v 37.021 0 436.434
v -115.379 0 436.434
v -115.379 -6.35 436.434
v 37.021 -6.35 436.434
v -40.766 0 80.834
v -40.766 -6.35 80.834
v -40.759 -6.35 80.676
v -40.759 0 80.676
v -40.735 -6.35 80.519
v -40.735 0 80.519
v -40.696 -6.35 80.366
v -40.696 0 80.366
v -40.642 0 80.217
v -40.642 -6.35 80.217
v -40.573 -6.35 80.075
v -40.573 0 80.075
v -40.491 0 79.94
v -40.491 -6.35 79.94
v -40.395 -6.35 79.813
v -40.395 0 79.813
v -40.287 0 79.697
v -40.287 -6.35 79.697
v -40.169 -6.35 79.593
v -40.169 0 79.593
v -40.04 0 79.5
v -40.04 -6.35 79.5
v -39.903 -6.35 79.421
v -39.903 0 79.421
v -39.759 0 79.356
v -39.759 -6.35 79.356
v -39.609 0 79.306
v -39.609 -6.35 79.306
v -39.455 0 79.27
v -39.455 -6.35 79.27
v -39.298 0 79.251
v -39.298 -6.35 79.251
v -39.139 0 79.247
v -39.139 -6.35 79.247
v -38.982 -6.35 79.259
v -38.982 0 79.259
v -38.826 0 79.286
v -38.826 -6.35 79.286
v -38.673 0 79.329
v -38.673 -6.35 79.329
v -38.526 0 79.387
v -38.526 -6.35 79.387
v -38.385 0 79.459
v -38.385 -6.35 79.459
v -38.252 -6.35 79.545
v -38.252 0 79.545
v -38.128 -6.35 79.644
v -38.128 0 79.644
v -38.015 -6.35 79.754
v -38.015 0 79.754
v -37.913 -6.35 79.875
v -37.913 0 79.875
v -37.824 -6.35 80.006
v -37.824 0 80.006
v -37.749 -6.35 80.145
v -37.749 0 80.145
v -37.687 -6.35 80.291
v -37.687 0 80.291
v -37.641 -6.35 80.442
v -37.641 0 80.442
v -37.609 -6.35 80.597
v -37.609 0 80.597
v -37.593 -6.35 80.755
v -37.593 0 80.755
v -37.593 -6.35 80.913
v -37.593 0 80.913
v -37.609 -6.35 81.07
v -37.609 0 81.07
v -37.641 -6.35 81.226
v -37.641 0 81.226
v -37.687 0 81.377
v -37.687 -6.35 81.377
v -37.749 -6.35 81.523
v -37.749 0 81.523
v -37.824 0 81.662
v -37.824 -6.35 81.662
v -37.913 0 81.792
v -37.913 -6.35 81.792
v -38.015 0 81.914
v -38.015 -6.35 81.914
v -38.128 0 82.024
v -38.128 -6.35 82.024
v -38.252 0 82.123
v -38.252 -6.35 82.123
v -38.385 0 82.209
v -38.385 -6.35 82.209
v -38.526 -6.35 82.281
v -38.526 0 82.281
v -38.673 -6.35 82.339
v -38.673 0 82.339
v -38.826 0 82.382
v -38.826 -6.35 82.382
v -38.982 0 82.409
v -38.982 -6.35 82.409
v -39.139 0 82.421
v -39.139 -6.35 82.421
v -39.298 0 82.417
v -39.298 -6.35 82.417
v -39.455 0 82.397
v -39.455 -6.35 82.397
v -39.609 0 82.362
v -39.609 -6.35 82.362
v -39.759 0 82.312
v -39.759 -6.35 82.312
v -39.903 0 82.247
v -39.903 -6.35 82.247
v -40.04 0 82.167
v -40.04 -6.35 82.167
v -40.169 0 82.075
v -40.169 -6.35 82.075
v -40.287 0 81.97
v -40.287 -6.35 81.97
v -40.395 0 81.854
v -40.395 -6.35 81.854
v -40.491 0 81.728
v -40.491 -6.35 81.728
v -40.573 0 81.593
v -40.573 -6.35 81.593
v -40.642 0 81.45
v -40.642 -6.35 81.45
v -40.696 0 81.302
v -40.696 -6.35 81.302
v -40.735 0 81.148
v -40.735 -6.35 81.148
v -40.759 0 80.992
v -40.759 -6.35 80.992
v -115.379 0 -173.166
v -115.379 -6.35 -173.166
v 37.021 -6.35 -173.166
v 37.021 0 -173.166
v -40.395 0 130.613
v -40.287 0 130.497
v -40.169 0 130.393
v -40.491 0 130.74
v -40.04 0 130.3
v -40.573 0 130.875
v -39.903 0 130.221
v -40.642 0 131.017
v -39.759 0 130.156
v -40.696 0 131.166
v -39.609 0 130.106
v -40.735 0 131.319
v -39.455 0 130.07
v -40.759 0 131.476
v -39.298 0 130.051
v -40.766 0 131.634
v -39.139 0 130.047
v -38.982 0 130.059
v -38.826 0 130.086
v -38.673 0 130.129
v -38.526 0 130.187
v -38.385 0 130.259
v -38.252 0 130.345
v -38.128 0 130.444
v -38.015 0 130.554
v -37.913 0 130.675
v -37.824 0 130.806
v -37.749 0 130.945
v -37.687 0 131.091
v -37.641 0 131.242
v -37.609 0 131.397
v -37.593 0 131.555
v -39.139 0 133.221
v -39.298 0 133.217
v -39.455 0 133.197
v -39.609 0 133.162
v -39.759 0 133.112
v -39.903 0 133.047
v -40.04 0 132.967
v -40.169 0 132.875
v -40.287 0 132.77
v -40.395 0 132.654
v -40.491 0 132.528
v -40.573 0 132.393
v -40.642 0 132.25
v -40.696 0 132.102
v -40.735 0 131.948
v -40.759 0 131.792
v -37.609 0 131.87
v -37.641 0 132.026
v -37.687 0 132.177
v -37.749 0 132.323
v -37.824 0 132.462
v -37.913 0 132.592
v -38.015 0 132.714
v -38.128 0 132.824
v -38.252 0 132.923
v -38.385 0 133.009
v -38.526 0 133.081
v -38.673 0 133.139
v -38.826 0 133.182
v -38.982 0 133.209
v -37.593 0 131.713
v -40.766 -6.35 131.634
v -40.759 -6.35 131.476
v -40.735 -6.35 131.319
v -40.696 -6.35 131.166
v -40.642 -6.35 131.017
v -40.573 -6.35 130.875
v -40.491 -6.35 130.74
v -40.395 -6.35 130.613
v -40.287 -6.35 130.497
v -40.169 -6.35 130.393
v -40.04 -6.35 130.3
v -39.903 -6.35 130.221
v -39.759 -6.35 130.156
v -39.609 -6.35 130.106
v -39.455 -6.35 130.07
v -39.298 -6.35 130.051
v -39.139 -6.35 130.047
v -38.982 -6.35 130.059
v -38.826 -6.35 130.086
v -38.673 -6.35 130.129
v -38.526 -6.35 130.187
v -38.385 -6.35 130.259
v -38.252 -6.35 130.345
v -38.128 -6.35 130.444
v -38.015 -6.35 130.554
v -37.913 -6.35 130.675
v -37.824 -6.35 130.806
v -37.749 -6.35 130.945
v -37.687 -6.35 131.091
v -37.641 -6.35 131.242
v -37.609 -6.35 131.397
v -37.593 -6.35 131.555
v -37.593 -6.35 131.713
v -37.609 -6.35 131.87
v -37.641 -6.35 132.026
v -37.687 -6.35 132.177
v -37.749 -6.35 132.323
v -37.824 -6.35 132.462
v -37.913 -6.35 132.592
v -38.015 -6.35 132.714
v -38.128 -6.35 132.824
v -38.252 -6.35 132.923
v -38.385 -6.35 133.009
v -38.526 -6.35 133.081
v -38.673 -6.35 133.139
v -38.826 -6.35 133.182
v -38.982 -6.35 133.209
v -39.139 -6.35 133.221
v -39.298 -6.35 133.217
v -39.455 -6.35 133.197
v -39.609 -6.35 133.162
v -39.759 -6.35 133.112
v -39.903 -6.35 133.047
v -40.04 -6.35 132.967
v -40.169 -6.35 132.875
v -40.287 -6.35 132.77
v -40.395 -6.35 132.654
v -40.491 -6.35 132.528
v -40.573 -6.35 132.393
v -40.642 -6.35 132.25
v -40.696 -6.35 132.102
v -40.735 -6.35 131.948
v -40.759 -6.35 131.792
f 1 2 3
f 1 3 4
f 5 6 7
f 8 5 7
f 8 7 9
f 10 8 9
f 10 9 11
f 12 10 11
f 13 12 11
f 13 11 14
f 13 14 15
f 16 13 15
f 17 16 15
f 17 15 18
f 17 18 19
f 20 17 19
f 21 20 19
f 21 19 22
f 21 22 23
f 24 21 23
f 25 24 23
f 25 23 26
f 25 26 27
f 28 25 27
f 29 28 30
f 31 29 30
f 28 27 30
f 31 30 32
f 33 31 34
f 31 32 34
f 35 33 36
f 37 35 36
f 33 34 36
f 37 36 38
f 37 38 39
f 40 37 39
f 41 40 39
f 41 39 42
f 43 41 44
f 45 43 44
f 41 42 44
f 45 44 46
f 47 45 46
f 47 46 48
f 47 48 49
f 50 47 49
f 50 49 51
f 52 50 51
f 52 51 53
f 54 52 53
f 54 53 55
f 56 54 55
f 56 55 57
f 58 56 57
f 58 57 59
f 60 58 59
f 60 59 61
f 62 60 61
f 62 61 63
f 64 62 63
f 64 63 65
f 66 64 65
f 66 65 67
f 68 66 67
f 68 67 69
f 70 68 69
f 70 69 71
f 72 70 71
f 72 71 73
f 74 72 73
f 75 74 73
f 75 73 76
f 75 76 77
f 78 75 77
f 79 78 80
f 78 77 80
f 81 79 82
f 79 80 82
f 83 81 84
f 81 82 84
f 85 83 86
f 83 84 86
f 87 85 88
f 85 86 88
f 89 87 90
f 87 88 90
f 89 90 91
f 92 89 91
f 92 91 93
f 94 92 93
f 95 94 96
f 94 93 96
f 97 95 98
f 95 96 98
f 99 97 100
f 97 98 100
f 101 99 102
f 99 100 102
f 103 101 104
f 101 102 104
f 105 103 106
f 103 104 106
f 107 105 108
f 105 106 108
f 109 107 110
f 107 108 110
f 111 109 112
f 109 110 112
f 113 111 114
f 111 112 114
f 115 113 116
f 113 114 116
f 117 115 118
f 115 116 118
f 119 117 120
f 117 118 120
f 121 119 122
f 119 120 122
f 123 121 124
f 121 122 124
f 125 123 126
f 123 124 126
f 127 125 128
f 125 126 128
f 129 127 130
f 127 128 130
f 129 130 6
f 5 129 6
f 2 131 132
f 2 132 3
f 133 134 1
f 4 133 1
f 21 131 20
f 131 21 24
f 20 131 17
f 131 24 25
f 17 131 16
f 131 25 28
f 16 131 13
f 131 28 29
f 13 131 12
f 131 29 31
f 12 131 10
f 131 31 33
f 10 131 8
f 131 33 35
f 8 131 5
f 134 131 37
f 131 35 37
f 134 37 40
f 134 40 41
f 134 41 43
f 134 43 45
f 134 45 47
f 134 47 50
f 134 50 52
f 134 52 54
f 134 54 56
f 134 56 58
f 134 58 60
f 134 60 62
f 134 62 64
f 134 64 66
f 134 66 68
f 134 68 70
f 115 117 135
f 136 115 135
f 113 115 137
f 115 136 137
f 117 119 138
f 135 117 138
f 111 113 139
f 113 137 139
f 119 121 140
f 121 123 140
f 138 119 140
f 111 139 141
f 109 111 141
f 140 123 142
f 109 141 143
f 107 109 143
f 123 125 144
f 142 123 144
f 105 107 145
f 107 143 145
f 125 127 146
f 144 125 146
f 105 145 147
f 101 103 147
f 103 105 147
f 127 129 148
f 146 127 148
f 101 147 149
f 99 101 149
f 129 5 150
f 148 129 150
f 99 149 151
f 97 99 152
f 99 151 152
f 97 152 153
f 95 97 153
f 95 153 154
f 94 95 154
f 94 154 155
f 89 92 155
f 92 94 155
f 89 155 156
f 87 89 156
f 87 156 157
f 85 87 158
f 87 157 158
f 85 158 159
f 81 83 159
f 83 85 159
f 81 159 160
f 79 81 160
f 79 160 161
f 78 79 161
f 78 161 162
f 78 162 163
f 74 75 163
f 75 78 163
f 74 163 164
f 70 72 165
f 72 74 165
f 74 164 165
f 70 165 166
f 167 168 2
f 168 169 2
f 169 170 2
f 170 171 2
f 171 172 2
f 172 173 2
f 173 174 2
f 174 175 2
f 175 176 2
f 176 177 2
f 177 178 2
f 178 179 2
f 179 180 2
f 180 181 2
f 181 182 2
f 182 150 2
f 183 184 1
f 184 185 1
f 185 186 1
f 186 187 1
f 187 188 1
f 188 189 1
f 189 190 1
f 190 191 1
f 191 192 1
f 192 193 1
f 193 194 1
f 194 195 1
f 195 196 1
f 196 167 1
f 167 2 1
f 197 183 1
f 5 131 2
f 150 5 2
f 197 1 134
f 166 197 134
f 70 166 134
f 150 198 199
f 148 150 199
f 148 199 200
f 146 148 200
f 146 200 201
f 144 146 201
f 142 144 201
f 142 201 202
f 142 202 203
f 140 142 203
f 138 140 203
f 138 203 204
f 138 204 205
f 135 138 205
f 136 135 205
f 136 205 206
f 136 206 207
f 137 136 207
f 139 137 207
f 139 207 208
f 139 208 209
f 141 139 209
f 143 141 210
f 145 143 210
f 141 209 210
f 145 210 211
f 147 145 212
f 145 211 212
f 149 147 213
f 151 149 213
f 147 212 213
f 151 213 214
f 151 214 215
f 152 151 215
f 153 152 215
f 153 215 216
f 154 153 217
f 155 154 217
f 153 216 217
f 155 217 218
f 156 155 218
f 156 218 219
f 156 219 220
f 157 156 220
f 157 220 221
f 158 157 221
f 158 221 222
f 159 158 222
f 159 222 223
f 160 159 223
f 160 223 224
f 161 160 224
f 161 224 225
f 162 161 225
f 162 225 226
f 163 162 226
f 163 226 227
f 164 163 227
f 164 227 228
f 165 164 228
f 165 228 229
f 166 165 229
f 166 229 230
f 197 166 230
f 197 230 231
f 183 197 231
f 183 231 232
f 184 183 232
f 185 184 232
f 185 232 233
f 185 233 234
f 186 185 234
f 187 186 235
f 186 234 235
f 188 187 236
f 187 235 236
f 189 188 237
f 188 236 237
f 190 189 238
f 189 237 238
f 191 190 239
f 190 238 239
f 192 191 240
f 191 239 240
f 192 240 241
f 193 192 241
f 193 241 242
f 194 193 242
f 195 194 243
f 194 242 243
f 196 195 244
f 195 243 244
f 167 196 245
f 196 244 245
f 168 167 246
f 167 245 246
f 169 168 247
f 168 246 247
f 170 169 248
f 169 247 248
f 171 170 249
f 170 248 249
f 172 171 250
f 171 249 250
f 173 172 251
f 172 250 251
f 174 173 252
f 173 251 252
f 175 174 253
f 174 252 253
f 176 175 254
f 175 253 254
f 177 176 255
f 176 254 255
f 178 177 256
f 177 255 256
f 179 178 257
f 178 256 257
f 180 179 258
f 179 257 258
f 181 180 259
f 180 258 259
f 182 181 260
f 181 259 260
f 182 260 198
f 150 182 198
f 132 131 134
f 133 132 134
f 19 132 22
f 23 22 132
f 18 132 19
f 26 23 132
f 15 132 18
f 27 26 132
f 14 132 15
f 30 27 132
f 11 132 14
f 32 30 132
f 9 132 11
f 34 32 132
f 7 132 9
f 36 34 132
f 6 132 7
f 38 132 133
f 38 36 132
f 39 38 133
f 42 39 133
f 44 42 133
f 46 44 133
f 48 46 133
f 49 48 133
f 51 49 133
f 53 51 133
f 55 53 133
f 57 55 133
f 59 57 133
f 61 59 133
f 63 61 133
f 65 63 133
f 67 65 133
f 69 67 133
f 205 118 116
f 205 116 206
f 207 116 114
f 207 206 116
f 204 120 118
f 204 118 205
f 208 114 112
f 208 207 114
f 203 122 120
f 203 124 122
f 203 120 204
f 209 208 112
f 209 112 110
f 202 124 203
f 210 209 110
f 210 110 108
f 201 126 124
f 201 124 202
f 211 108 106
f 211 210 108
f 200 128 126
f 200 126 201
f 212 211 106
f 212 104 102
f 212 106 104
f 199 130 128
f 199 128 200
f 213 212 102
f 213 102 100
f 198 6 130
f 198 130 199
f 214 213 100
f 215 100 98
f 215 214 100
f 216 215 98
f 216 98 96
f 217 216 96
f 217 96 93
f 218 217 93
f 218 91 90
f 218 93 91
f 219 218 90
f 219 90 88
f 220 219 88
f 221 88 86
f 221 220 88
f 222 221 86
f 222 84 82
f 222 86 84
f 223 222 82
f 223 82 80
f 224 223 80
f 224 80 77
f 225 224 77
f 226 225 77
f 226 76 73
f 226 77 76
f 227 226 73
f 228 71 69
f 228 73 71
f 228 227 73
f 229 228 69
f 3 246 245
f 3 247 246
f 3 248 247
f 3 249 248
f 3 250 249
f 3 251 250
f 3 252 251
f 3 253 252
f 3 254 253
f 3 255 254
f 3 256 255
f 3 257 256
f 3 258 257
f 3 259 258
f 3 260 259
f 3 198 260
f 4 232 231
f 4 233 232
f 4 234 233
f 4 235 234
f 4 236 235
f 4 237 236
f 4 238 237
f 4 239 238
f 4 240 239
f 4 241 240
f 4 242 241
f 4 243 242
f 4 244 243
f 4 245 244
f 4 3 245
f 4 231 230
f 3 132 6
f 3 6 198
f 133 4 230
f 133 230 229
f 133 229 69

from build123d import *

# Parameters (mm, degrees)
F0_W     = 152.4
F0_H     = 609.6
F1_DEPTH = 6.35
F2_D     = 3.175


with BuildPart() as f1:
    # F0 (on Front) → F1 (new body)
    with BuildSketch(Plane.XZ):
        with Locations((-39.1789237037, 131.6338440617)):
            Rectangle(F0_W, F0_H)
    extrude(amount=F1_DEPTH)

    # F2 (through all)
    with Locations(Plane(origin=(0, 0, 0), x_dir=(1, 0, 0), z_dir=(0, 1, 0))):
        with Locations((-39.1789237037, -131.6338440617), (-39.1789237037, -80.8338440617)):
            Hole(F2_D / 2)


solid = f1.part
